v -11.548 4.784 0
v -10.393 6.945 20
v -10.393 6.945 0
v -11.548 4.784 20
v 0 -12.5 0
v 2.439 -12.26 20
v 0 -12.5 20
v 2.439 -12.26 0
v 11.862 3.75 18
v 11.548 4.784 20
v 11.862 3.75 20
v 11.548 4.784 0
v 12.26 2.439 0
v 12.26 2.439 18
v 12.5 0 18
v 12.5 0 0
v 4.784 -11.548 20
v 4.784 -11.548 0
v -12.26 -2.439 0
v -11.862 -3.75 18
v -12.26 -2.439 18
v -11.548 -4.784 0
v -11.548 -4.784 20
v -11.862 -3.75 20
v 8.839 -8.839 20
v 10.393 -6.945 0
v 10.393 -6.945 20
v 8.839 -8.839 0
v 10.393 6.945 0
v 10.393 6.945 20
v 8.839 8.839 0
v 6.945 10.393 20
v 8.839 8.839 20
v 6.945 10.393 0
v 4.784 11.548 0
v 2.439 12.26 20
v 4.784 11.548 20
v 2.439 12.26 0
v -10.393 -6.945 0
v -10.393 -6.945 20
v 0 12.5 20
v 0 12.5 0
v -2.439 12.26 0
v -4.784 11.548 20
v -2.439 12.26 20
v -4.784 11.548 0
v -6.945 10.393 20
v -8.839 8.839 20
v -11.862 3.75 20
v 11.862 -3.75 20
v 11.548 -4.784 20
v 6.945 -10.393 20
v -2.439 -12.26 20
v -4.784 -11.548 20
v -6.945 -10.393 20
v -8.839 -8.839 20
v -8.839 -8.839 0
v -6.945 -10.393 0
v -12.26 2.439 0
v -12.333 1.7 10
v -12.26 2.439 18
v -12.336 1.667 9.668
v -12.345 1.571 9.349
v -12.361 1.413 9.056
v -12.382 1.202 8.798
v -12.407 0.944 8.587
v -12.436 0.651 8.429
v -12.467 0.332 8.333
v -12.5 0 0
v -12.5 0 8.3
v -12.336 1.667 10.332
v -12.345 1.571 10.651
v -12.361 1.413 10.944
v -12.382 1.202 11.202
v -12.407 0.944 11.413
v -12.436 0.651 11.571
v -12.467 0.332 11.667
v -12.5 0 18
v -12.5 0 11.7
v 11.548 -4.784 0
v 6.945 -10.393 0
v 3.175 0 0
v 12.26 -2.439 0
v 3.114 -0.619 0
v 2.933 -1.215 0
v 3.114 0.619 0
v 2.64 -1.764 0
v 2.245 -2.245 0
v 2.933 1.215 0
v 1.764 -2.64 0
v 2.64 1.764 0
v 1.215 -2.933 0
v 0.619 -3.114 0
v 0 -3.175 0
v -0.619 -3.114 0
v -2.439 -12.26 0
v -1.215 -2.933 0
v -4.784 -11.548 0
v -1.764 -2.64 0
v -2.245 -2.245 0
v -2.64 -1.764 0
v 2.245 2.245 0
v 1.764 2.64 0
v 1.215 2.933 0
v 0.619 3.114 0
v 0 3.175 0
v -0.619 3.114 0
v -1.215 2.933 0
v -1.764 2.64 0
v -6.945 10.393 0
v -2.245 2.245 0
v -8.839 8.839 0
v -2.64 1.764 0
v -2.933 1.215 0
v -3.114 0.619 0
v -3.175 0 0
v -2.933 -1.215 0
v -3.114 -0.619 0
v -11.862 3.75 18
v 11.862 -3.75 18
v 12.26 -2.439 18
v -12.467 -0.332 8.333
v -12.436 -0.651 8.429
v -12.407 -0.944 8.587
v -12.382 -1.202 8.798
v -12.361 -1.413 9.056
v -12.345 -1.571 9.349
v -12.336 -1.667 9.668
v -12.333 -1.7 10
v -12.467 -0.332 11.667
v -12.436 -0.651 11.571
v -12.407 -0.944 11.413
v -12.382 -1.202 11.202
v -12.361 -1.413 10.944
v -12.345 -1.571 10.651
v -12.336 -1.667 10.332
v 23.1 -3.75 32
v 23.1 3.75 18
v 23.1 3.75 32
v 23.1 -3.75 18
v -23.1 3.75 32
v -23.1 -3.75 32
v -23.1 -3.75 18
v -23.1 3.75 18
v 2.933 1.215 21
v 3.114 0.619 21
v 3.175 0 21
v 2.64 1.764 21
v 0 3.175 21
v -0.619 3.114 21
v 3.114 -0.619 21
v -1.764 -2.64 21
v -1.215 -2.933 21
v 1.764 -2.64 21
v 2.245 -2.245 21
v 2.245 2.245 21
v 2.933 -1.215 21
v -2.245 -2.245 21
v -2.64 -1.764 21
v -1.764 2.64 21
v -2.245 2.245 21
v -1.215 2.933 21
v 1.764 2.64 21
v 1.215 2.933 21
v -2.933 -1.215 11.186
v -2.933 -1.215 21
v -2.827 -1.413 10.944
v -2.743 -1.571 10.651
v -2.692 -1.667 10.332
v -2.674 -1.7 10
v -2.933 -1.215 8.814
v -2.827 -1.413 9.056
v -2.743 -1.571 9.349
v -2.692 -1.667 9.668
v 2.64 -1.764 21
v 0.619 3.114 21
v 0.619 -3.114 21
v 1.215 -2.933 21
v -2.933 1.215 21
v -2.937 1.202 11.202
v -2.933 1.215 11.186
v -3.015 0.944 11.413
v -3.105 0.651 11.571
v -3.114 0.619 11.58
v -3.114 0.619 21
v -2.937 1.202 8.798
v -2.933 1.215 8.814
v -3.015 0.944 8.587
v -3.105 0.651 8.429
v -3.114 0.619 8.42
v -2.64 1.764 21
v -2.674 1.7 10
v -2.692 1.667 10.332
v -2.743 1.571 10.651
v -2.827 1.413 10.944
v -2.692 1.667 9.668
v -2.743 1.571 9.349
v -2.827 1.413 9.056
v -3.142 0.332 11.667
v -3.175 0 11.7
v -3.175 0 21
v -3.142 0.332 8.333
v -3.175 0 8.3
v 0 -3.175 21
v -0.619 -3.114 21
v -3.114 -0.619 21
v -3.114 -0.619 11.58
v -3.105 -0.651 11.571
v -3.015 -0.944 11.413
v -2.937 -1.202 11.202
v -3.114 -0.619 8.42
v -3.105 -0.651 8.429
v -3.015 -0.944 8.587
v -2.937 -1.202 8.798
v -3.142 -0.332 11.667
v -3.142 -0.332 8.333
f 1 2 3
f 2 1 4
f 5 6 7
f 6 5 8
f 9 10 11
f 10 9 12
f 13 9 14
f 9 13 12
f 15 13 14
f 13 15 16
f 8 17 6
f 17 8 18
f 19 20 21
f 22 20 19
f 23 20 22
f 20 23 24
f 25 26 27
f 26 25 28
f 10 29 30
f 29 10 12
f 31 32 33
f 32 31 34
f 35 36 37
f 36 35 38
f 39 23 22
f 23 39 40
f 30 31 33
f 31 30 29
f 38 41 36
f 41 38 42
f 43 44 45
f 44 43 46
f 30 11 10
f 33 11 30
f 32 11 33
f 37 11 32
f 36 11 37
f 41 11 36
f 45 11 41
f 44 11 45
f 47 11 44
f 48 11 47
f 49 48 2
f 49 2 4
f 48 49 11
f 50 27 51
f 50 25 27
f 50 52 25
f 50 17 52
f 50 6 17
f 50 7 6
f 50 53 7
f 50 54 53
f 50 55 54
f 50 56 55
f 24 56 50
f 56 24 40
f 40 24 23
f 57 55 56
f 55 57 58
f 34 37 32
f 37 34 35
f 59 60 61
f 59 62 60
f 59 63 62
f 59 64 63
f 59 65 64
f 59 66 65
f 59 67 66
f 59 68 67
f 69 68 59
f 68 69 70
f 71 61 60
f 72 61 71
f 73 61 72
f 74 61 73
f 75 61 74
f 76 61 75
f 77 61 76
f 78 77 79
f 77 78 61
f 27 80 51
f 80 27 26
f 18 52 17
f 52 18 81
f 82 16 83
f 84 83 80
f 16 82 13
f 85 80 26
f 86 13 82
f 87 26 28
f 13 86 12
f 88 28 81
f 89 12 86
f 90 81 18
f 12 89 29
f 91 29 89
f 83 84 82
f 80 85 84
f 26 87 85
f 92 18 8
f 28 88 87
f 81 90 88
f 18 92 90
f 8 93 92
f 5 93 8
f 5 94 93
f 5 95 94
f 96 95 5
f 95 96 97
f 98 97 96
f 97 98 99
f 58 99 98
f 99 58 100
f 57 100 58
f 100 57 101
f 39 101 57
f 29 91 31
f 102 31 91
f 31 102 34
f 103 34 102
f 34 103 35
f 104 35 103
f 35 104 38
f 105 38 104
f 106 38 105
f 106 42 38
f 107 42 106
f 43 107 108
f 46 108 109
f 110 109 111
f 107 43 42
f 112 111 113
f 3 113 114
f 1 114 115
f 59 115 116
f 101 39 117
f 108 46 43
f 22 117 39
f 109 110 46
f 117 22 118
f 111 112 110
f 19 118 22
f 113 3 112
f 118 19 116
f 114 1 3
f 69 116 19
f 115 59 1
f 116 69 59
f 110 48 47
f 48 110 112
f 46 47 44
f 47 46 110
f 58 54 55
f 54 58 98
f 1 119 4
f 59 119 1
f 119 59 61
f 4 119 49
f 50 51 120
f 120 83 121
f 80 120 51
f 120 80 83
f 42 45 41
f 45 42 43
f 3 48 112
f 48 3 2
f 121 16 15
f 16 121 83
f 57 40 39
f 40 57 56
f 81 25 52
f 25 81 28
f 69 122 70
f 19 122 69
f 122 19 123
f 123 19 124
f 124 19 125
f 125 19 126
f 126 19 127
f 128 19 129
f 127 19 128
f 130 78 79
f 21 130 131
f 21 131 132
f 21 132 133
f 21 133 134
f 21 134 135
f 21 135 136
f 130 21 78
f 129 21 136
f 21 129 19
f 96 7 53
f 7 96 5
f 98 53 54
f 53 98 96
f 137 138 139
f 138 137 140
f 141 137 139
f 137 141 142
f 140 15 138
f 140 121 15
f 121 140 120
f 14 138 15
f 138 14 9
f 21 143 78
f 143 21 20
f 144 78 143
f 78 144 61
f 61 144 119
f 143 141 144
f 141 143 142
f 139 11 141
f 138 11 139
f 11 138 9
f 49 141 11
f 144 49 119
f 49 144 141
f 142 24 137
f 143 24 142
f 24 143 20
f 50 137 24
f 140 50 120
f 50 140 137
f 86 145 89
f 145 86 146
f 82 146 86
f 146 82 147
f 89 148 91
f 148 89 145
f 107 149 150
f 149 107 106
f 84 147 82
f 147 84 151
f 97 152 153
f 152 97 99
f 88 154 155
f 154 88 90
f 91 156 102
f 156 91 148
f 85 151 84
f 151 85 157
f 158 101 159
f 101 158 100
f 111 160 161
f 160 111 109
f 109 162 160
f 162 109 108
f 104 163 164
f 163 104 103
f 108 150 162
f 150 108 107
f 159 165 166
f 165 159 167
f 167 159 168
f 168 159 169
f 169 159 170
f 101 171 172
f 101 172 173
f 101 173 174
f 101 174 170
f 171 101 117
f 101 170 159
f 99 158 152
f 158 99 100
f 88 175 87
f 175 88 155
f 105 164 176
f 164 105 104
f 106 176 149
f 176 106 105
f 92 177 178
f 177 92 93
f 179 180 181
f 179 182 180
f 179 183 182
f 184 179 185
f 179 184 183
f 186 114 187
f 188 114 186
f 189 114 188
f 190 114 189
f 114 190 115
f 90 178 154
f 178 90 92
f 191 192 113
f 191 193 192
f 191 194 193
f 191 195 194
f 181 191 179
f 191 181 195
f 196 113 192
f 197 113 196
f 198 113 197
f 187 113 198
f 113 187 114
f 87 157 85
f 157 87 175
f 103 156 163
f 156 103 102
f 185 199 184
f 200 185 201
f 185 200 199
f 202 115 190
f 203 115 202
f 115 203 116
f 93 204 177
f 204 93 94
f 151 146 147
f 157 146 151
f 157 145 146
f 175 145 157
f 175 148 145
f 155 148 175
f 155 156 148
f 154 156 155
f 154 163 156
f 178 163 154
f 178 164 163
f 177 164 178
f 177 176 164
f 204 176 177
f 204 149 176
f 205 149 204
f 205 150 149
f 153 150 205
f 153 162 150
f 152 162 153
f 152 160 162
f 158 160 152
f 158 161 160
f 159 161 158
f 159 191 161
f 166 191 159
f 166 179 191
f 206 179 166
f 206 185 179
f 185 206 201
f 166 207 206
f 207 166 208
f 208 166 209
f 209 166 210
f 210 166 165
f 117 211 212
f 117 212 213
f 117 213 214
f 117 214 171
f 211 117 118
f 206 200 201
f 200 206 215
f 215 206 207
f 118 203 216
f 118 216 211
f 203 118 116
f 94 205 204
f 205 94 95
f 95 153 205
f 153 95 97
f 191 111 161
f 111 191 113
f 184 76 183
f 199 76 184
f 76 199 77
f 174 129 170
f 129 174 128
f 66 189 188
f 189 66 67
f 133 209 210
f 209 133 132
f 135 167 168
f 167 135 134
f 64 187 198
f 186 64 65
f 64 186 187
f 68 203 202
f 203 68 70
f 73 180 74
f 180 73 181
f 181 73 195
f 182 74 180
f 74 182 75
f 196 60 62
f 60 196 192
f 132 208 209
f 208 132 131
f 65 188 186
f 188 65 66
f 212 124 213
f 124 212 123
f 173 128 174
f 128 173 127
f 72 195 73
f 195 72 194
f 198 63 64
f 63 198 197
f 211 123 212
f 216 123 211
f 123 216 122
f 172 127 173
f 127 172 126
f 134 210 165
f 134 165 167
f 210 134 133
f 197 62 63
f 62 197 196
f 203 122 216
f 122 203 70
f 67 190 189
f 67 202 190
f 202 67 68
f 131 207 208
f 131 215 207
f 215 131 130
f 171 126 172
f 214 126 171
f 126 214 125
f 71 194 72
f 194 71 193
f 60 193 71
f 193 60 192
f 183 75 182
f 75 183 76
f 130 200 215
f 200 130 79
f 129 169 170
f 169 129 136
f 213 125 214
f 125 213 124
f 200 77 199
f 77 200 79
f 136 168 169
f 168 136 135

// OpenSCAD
$fn = 32;

// ----------------------------------------------------------------------
// Hand knob: 25 x 46.2 x 20 mm
// ----------------------------------------------------------------------

// --- parameters (mm) ---
knob_d = 25;              // knob diameter
knob_h = 20;              // knob height
bore_d = 6.35;            // shaft bore
set_d = 3.4;              // set screw tap hole
wing_l = 46.2;            // wing span
wing_w = 7.5;             // wing width
wing_h = 12;              // wing thickness

module body() {
  cylinder(h = knob_h, d = knob_d);
}

module wing() {
  /* wing sunk 2 mm into the knob so the joint overlaps */
  translate([-wing_l / 2, -wing_w / 2, knob_h - 2])
    cube([wing_l, wing_w, wing_h + 2]);
}

difference() {
  union() {
    body();
    wing();
  }
  translate([0, 0, -1]) cylinder(h = knob_h + 0 + 2, d = bore_d);
  translate([-knob_d / 2 - 1, 0, knob_h * 0.5]) rotate([0, 90, 0]) cylinder(h = knob_d / 2 + 2, d = set_d);
}
